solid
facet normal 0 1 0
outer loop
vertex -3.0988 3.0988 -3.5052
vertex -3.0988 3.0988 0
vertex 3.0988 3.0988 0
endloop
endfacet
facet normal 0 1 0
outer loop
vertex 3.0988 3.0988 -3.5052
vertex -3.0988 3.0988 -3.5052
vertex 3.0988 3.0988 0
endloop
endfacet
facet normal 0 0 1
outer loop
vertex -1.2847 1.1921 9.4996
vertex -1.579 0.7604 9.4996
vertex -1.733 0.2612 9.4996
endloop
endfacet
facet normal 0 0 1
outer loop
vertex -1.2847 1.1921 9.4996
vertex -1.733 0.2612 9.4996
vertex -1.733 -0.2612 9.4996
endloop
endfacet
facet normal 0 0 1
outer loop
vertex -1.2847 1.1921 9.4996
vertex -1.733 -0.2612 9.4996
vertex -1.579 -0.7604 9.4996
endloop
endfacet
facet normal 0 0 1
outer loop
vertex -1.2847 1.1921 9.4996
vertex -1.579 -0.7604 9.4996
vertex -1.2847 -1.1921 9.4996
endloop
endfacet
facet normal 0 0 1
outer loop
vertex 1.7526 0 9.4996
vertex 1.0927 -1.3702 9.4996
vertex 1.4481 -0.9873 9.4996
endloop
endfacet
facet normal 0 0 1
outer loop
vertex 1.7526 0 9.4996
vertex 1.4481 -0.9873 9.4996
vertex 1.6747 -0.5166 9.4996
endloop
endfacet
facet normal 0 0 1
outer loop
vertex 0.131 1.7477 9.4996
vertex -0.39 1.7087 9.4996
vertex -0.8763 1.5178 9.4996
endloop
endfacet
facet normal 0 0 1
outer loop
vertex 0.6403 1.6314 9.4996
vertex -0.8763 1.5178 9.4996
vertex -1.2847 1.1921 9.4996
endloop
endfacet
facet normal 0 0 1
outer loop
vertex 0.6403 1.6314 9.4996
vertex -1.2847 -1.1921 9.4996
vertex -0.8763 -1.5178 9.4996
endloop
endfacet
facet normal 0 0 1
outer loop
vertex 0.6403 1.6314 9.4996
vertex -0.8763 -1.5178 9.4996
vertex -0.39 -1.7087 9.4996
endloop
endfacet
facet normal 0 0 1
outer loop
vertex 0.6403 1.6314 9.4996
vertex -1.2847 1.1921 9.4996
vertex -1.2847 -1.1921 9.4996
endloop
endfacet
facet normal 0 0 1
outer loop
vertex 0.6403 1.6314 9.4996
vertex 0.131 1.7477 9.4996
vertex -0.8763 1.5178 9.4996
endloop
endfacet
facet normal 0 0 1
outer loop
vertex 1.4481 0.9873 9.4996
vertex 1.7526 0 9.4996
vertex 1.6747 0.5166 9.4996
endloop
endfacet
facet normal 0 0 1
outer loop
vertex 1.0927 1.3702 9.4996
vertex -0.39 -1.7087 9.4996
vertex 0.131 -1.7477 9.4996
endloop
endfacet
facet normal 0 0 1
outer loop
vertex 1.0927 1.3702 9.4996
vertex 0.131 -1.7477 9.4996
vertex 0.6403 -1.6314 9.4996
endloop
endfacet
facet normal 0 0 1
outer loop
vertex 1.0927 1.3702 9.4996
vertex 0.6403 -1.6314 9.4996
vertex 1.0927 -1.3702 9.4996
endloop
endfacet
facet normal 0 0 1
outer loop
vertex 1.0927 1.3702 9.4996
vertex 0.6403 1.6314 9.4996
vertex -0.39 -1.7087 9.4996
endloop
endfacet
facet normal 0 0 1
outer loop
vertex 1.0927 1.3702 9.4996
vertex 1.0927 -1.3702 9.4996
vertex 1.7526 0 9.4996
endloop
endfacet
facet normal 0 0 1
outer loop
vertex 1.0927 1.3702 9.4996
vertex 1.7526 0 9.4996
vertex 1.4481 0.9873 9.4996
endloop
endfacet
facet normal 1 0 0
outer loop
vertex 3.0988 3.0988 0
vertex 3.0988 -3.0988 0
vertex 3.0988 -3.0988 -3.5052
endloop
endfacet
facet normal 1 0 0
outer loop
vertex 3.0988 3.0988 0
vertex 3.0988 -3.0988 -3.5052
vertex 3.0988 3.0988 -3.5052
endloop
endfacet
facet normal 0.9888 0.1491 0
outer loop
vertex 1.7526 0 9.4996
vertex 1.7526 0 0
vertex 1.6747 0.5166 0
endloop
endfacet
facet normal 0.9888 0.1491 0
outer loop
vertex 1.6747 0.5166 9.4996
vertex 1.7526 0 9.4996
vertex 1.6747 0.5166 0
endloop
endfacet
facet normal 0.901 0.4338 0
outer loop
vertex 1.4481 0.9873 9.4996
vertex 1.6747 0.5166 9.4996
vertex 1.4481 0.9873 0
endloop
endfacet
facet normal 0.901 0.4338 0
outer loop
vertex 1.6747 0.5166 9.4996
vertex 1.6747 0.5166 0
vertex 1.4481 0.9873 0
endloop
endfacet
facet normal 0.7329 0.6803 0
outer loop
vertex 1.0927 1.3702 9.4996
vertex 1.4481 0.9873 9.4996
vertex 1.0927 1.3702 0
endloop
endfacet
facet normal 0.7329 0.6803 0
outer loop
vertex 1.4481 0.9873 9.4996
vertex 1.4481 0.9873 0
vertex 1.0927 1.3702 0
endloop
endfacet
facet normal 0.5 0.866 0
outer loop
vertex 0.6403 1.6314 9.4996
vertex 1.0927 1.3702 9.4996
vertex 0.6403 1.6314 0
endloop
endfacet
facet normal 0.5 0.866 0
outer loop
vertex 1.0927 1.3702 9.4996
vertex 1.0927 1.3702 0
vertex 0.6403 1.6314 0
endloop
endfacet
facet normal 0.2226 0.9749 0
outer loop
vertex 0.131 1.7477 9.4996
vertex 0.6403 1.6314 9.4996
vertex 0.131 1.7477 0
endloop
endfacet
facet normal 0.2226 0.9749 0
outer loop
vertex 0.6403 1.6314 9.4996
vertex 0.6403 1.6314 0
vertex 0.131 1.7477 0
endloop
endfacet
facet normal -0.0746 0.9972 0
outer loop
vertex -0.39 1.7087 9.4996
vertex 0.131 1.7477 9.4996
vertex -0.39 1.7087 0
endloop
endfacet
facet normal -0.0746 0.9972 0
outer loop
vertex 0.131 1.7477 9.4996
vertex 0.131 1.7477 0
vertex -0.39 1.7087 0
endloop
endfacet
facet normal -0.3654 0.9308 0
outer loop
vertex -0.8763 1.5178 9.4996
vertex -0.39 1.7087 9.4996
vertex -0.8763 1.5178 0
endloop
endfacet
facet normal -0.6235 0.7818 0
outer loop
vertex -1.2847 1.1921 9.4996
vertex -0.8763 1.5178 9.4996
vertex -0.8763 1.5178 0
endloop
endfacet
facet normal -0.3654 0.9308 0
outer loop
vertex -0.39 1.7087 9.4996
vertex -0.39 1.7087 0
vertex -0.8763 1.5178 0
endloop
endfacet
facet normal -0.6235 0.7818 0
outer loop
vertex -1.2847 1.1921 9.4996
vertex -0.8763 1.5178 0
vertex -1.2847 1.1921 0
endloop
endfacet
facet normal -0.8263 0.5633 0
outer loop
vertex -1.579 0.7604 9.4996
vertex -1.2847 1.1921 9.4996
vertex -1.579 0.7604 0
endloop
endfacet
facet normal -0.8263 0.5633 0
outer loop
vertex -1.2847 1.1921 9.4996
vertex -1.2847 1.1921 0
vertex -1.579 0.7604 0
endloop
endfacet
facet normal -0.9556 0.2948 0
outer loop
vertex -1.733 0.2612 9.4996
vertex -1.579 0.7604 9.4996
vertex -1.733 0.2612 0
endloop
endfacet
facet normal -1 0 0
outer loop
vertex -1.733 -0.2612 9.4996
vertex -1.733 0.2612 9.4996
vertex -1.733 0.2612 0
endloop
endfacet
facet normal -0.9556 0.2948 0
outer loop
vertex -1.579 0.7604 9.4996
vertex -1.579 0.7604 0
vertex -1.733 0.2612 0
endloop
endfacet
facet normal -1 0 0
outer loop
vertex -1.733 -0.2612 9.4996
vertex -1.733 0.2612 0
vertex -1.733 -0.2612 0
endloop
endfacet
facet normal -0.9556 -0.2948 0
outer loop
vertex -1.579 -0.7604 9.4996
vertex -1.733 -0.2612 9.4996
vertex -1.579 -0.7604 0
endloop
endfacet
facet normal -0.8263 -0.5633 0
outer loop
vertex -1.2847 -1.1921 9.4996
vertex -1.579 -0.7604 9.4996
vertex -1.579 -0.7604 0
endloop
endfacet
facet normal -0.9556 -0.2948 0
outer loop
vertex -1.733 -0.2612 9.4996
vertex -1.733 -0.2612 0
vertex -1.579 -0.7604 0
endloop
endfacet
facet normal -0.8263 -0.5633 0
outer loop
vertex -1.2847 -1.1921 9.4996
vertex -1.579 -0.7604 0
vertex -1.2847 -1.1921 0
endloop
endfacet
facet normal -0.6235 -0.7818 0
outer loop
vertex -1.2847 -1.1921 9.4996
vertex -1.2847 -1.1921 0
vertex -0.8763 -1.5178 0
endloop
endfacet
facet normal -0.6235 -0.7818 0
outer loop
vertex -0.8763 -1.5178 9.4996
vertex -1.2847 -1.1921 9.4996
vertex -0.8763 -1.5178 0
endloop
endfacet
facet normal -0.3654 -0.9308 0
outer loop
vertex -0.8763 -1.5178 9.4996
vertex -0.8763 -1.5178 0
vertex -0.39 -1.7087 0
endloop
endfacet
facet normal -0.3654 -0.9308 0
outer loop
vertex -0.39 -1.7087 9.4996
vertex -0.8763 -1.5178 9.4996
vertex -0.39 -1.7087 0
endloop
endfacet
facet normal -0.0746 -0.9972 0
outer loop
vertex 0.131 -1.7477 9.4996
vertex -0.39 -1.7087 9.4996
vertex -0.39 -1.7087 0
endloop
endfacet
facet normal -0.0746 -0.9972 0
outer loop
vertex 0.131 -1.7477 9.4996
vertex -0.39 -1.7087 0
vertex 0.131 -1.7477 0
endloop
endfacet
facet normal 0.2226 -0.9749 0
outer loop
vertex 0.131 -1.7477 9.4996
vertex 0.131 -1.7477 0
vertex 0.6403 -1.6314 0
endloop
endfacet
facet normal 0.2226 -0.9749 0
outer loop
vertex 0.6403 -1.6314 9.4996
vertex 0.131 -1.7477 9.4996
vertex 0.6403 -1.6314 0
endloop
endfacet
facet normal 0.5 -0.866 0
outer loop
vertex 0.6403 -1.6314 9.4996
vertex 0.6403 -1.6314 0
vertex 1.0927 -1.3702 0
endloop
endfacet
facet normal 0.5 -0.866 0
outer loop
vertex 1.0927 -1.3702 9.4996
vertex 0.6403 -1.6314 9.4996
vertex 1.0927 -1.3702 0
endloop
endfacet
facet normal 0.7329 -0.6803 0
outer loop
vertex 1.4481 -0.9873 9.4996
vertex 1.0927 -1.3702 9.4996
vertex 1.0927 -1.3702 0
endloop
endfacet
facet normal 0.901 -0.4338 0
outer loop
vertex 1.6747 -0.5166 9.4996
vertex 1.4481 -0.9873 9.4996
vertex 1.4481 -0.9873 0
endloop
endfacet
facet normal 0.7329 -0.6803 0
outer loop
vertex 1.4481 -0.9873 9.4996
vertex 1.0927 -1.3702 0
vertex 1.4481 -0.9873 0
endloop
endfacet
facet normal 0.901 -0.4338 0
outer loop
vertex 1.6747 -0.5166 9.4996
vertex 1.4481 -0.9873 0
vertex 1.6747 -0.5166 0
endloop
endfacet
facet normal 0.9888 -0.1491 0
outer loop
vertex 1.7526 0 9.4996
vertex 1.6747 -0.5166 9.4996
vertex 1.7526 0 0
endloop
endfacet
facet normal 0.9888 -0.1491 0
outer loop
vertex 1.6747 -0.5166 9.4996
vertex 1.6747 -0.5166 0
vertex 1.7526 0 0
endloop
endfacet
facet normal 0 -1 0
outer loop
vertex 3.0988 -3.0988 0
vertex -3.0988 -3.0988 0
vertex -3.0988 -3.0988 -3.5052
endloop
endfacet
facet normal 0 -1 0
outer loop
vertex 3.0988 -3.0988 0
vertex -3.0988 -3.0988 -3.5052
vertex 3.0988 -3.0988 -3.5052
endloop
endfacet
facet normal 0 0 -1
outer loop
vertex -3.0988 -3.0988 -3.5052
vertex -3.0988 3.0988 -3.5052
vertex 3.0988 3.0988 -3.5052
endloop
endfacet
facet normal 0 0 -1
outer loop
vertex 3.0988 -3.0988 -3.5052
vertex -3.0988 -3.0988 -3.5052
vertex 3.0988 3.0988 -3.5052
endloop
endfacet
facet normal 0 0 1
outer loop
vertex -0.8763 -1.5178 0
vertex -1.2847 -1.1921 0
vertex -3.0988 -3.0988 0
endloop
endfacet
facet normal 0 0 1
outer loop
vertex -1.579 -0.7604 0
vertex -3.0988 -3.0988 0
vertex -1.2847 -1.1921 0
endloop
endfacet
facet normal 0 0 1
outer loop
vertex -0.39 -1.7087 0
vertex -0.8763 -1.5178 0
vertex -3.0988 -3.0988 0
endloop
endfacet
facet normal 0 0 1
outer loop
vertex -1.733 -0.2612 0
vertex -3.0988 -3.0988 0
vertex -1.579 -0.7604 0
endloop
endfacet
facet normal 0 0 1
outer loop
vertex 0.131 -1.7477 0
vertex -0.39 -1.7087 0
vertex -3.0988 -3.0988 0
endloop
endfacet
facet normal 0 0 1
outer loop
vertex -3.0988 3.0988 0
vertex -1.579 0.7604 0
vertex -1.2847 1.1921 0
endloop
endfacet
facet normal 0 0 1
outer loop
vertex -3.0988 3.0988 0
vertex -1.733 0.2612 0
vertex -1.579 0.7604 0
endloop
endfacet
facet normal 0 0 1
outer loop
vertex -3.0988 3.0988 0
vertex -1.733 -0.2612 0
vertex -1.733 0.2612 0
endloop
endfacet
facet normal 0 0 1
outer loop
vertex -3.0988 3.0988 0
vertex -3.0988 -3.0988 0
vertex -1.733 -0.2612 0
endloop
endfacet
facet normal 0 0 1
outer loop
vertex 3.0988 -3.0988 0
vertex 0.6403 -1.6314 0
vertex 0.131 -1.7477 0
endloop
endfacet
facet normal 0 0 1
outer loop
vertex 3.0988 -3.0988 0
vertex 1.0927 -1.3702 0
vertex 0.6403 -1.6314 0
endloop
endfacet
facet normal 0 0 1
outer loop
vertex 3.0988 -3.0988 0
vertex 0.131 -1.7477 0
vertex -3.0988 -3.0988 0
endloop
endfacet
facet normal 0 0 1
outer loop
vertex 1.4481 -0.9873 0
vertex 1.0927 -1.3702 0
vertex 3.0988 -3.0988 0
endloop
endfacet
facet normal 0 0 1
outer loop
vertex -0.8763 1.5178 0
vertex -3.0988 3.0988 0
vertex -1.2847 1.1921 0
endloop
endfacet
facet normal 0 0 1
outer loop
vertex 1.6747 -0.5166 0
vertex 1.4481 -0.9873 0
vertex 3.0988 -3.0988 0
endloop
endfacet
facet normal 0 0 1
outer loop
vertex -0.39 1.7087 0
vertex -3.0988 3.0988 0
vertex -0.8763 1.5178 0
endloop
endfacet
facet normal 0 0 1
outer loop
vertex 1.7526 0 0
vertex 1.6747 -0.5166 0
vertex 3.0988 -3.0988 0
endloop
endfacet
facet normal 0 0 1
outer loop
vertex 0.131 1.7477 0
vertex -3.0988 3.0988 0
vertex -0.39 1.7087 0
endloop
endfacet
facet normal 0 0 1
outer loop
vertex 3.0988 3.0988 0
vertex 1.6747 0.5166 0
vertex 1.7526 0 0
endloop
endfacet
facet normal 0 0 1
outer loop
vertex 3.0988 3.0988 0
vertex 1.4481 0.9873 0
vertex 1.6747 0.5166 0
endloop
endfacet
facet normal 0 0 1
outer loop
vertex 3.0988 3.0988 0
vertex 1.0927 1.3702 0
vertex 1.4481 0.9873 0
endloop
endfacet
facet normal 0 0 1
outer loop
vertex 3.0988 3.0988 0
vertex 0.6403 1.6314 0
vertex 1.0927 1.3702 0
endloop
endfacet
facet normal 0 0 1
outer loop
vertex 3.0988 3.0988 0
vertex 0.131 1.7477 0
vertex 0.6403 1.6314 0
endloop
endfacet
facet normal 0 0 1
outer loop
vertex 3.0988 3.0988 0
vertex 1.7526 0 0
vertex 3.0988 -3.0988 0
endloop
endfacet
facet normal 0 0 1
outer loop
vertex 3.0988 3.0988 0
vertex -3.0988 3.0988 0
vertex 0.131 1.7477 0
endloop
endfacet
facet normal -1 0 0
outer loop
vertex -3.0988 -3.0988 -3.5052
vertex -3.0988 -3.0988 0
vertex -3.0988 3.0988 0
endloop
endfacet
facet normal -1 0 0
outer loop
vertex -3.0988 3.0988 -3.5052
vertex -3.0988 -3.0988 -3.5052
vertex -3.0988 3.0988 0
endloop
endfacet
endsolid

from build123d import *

# Parameters (mm, degrees)
SKETCH1_W           = 6.1976
SKETCH1_H           = 6.1976
BOSS_EXTRUDE1_DEPTH = 3.5052
SKETCH2_R           = 1.7526
BOSS_EXTRUDE2_DEPTH = 9.4996


with BuildPart() as part:
    # Sketch1 → Boss-Extrude1 (new body)
    with BuildSketch(Plane.XY):
        Rectangle(SKETCH1_W, SKETCH1_H)
    extrude(amount=-BOSS_EXTRUDE1_DEPTH)

    # Sketch2 → Boss-Extrude2 (add)
    with BuildSketch(Plane.XY):
        Circle(SKETCH2_R)
    extrude(amount=BOSS_EXTRUDE2_DEPTH)


solid = part.part
